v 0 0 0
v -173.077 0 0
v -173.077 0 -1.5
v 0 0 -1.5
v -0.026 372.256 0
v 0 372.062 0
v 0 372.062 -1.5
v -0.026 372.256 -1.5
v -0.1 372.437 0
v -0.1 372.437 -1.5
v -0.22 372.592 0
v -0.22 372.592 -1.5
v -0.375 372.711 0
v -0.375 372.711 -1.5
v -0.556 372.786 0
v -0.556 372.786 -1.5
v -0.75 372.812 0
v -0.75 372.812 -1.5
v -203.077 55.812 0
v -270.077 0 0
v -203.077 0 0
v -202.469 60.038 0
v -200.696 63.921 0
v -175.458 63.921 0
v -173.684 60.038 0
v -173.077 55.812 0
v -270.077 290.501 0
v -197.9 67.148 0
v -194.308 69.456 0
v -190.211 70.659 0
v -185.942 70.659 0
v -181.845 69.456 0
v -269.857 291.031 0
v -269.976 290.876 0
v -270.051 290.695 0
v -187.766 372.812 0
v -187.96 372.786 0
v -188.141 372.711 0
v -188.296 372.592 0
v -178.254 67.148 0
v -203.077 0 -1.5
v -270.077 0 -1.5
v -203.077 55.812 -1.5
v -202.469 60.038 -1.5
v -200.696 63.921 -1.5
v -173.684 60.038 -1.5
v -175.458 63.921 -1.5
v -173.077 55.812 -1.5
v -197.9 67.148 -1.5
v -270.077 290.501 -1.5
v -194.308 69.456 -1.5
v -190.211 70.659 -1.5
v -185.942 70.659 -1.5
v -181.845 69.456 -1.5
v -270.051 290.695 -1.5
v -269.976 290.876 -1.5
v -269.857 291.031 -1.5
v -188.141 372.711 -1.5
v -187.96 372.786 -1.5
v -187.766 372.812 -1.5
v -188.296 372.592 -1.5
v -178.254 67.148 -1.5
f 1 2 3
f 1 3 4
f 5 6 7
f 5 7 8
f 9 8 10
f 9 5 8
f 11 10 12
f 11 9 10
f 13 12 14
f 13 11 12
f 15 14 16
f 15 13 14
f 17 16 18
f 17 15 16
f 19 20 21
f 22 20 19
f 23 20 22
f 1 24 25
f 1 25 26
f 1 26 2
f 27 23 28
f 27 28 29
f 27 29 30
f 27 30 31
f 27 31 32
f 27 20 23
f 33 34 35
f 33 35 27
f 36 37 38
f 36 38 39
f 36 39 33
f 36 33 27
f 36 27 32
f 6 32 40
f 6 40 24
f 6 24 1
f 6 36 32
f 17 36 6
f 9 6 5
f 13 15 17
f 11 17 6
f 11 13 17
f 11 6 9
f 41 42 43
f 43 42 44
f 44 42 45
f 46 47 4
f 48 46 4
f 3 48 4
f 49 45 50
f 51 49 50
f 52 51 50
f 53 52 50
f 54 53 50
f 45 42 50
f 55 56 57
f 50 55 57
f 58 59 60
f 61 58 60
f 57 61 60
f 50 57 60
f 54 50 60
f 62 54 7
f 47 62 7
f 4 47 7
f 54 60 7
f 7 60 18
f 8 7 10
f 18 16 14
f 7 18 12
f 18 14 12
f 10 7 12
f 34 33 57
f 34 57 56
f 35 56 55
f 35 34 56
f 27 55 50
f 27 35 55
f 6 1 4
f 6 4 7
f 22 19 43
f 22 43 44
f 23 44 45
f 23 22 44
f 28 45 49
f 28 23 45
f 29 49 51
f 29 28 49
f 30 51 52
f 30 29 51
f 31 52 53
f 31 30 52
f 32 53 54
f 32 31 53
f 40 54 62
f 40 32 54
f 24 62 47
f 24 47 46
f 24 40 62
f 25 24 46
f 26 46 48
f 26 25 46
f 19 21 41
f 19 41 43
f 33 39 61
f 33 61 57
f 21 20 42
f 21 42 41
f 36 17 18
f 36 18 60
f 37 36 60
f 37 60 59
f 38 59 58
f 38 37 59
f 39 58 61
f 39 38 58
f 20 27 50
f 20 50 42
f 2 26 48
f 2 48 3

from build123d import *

# Parameters (mm, degrees)
SM_BASE_FLANGE_1_DEPTH = 1.5


# Sheet-metal steps are written as plain solids
with BuildPart() as part:
    # Sketch 1 → Базовая кромка1 (new body)
    with BuildSketch(Plane.XY):
        with BuildLine():
            Line((-270.076706029, 290.501117881), (-270.076706029, 0))
            Line((-270.076706029, 0), (-203.076706029, 0))
            Line((-203.076706029, 0), (-203.076706029, 55.811778053))
            ThreePointArc((-203.076706029, 55.811778053), (-188.076706029, 70.811778053), (-173.076706029, 55.811778053))
            Line((-173.076706029, 55.811778053), (-173.076706029, 0))
            Line((-173.076706029, 0), (0, 0))
            Line((0, 0), (0, 372.061778053))
            ThreePointArc((0, 372.061778053), (-0.219669914, 372.592108139), (-0.75, 372.811778053))
            Line((-0.75, 372.811778053), (-187.766045857, 372.811778053))
            ThreePointArc((-187.766045857, 372.811778053), (-188.053058432, 372.754687702), (-188.296375943, 372.592108139))
            Line((-188.296375943, 372.592108139), (-269.857036115, 291.031447967))
            ThreePointArc((-269.857036115, 291.031447967), (-270.019615678, 290.788130455), (-270.076706029, 290.501117881))
        make_face()
    extrude(amount=-SM_BASE_FLANGE_1_DEPTH)


solid = part.part
